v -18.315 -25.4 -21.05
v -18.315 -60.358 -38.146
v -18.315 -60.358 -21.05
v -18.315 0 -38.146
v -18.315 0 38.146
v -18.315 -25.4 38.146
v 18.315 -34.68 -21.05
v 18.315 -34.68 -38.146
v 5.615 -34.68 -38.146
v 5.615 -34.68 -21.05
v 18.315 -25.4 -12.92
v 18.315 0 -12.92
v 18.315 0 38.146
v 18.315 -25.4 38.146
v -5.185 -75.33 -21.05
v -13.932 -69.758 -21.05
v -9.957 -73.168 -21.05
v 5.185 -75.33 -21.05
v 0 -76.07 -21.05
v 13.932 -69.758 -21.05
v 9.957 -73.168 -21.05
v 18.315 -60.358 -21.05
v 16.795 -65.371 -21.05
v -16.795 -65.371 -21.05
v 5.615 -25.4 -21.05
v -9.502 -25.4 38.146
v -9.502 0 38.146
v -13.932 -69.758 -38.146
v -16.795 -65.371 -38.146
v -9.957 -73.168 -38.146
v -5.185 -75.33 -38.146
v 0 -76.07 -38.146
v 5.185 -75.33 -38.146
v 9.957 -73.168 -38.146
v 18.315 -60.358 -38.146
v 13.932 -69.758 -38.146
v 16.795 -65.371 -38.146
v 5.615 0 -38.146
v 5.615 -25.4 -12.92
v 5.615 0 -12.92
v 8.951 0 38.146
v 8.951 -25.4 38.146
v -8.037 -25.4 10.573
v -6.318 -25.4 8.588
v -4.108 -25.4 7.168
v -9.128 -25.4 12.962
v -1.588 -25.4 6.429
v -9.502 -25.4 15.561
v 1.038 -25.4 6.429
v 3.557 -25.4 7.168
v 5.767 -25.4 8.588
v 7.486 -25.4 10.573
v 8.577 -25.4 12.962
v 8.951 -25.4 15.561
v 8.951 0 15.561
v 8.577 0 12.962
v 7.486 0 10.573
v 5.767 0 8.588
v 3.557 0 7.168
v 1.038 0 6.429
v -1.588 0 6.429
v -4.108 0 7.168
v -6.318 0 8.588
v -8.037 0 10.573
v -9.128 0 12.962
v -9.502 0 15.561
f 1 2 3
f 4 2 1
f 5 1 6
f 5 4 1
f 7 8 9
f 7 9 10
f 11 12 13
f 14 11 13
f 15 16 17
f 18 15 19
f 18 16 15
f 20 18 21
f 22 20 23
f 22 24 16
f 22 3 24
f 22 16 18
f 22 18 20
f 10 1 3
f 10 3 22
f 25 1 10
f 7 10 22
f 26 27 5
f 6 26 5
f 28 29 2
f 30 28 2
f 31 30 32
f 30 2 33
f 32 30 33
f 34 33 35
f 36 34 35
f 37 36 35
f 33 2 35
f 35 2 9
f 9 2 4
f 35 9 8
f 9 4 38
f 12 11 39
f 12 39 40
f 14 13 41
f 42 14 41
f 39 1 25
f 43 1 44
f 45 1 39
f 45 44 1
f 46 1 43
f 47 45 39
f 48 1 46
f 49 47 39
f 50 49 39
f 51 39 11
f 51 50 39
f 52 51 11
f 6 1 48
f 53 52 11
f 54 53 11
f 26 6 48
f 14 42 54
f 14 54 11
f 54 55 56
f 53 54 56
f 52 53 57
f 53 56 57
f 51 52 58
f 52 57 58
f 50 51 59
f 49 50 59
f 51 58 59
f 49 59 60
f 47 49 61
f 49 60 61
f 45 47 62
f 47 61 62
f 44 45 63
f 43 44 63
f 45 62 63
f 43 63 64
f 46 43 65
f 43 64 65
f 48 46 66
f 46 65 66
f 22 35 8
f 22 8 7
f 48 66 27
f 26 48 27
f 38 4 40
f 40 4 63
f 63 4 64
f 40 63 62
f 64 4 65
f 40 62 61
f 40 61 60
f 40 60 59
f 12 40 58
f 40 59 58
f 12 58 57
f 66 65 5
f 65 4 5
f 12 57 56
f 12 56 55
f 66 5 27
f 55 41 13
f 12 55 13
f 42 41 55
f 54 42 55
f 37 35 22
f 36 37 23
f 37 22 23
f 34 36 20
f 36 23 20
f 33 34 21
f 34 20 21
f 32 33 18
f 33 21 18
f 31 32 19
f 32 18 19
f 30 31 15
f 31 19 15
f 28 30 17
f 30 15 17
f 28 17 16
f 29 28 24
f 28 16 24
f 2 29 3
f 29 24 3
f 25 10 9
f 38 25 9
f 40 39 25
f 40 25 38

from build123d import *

# Parameters (mm, degrees)
F1_DEPTH = 25.4
F2_W     = 36.63072
F2_H     = 17.09543
F3_DEPTH = 50.8
F5_DEPTH = 17.09643
F6_W     = 34.679536
F6_H     = 25.22513
F7_DEPTH = 12.7


with BuildPart() as f1:
    # F0 (on Front) → F1 (new body)
    with BuildSketch(Plane.XZ):
        with BuildLine():
            Line((-9.501953, 38.145531), (-18.31536, 38.145531))
            Line((-18.31536, 38.145531), (-18.31536, -38.145531))
            Line((-18.31536, -38.145531), (18.31536, -38.145531))
            Line((18.31536, -38.145531), (18.31536, 38.145531))
            Line((18.31536, 38.145531), (8.951116, 38.145531))
            Line((8.951116, 38.145531), (8.951116, 15.561176))
            ThreePointArc((8.951116, 15.561176), (-0.275418, 6.334641), (-9.501953, 15.561176))
            Line((-9.501953, 15.561176), (-9.501953, 38.145531))
        make_face()
    extrude(amount=F1_DEPTH)

    # F2 (on face) → F3 (join)
    with BuildSketch(Plane.XZ.offset(25.4)):
        with Locations((0, -29.597816)):
            Rectangle(F2_W, F2_H)
    extrude(amount=F3_DEPTH)

    # F4 (on face) → F5 (cut, through all)
    with BuildSketch(Plane.XY.offset(-21.050101)):
        with BuildLine():
            ThreePointArc((18.31536, -60.358326), (0, -76.070081), (-18.31536, -60.358326))
            Line((-18.31536, -60.358326), (-18.31536, -76.2))
            Line((-18.31536, -76.2), (18.31536, -76.2))
            Line((18.31536, -76.2), (18.31536, -60.358326))
        make_face()
    extrude(amount=-F5_DEPTH, mode=Mode.SUBTRACT)

    # F6 (on face) → F7 (cut)
    with BuildSketch(Plane.YZ.offset(18.31536)):
        with Locations((-17.339768, -25.532966)):
            Rectangle(F6_W, F6_H)
    extrude(amount=-F7_DEPTH, mode=Mode.SUBTRACT)


solid = f1.part
